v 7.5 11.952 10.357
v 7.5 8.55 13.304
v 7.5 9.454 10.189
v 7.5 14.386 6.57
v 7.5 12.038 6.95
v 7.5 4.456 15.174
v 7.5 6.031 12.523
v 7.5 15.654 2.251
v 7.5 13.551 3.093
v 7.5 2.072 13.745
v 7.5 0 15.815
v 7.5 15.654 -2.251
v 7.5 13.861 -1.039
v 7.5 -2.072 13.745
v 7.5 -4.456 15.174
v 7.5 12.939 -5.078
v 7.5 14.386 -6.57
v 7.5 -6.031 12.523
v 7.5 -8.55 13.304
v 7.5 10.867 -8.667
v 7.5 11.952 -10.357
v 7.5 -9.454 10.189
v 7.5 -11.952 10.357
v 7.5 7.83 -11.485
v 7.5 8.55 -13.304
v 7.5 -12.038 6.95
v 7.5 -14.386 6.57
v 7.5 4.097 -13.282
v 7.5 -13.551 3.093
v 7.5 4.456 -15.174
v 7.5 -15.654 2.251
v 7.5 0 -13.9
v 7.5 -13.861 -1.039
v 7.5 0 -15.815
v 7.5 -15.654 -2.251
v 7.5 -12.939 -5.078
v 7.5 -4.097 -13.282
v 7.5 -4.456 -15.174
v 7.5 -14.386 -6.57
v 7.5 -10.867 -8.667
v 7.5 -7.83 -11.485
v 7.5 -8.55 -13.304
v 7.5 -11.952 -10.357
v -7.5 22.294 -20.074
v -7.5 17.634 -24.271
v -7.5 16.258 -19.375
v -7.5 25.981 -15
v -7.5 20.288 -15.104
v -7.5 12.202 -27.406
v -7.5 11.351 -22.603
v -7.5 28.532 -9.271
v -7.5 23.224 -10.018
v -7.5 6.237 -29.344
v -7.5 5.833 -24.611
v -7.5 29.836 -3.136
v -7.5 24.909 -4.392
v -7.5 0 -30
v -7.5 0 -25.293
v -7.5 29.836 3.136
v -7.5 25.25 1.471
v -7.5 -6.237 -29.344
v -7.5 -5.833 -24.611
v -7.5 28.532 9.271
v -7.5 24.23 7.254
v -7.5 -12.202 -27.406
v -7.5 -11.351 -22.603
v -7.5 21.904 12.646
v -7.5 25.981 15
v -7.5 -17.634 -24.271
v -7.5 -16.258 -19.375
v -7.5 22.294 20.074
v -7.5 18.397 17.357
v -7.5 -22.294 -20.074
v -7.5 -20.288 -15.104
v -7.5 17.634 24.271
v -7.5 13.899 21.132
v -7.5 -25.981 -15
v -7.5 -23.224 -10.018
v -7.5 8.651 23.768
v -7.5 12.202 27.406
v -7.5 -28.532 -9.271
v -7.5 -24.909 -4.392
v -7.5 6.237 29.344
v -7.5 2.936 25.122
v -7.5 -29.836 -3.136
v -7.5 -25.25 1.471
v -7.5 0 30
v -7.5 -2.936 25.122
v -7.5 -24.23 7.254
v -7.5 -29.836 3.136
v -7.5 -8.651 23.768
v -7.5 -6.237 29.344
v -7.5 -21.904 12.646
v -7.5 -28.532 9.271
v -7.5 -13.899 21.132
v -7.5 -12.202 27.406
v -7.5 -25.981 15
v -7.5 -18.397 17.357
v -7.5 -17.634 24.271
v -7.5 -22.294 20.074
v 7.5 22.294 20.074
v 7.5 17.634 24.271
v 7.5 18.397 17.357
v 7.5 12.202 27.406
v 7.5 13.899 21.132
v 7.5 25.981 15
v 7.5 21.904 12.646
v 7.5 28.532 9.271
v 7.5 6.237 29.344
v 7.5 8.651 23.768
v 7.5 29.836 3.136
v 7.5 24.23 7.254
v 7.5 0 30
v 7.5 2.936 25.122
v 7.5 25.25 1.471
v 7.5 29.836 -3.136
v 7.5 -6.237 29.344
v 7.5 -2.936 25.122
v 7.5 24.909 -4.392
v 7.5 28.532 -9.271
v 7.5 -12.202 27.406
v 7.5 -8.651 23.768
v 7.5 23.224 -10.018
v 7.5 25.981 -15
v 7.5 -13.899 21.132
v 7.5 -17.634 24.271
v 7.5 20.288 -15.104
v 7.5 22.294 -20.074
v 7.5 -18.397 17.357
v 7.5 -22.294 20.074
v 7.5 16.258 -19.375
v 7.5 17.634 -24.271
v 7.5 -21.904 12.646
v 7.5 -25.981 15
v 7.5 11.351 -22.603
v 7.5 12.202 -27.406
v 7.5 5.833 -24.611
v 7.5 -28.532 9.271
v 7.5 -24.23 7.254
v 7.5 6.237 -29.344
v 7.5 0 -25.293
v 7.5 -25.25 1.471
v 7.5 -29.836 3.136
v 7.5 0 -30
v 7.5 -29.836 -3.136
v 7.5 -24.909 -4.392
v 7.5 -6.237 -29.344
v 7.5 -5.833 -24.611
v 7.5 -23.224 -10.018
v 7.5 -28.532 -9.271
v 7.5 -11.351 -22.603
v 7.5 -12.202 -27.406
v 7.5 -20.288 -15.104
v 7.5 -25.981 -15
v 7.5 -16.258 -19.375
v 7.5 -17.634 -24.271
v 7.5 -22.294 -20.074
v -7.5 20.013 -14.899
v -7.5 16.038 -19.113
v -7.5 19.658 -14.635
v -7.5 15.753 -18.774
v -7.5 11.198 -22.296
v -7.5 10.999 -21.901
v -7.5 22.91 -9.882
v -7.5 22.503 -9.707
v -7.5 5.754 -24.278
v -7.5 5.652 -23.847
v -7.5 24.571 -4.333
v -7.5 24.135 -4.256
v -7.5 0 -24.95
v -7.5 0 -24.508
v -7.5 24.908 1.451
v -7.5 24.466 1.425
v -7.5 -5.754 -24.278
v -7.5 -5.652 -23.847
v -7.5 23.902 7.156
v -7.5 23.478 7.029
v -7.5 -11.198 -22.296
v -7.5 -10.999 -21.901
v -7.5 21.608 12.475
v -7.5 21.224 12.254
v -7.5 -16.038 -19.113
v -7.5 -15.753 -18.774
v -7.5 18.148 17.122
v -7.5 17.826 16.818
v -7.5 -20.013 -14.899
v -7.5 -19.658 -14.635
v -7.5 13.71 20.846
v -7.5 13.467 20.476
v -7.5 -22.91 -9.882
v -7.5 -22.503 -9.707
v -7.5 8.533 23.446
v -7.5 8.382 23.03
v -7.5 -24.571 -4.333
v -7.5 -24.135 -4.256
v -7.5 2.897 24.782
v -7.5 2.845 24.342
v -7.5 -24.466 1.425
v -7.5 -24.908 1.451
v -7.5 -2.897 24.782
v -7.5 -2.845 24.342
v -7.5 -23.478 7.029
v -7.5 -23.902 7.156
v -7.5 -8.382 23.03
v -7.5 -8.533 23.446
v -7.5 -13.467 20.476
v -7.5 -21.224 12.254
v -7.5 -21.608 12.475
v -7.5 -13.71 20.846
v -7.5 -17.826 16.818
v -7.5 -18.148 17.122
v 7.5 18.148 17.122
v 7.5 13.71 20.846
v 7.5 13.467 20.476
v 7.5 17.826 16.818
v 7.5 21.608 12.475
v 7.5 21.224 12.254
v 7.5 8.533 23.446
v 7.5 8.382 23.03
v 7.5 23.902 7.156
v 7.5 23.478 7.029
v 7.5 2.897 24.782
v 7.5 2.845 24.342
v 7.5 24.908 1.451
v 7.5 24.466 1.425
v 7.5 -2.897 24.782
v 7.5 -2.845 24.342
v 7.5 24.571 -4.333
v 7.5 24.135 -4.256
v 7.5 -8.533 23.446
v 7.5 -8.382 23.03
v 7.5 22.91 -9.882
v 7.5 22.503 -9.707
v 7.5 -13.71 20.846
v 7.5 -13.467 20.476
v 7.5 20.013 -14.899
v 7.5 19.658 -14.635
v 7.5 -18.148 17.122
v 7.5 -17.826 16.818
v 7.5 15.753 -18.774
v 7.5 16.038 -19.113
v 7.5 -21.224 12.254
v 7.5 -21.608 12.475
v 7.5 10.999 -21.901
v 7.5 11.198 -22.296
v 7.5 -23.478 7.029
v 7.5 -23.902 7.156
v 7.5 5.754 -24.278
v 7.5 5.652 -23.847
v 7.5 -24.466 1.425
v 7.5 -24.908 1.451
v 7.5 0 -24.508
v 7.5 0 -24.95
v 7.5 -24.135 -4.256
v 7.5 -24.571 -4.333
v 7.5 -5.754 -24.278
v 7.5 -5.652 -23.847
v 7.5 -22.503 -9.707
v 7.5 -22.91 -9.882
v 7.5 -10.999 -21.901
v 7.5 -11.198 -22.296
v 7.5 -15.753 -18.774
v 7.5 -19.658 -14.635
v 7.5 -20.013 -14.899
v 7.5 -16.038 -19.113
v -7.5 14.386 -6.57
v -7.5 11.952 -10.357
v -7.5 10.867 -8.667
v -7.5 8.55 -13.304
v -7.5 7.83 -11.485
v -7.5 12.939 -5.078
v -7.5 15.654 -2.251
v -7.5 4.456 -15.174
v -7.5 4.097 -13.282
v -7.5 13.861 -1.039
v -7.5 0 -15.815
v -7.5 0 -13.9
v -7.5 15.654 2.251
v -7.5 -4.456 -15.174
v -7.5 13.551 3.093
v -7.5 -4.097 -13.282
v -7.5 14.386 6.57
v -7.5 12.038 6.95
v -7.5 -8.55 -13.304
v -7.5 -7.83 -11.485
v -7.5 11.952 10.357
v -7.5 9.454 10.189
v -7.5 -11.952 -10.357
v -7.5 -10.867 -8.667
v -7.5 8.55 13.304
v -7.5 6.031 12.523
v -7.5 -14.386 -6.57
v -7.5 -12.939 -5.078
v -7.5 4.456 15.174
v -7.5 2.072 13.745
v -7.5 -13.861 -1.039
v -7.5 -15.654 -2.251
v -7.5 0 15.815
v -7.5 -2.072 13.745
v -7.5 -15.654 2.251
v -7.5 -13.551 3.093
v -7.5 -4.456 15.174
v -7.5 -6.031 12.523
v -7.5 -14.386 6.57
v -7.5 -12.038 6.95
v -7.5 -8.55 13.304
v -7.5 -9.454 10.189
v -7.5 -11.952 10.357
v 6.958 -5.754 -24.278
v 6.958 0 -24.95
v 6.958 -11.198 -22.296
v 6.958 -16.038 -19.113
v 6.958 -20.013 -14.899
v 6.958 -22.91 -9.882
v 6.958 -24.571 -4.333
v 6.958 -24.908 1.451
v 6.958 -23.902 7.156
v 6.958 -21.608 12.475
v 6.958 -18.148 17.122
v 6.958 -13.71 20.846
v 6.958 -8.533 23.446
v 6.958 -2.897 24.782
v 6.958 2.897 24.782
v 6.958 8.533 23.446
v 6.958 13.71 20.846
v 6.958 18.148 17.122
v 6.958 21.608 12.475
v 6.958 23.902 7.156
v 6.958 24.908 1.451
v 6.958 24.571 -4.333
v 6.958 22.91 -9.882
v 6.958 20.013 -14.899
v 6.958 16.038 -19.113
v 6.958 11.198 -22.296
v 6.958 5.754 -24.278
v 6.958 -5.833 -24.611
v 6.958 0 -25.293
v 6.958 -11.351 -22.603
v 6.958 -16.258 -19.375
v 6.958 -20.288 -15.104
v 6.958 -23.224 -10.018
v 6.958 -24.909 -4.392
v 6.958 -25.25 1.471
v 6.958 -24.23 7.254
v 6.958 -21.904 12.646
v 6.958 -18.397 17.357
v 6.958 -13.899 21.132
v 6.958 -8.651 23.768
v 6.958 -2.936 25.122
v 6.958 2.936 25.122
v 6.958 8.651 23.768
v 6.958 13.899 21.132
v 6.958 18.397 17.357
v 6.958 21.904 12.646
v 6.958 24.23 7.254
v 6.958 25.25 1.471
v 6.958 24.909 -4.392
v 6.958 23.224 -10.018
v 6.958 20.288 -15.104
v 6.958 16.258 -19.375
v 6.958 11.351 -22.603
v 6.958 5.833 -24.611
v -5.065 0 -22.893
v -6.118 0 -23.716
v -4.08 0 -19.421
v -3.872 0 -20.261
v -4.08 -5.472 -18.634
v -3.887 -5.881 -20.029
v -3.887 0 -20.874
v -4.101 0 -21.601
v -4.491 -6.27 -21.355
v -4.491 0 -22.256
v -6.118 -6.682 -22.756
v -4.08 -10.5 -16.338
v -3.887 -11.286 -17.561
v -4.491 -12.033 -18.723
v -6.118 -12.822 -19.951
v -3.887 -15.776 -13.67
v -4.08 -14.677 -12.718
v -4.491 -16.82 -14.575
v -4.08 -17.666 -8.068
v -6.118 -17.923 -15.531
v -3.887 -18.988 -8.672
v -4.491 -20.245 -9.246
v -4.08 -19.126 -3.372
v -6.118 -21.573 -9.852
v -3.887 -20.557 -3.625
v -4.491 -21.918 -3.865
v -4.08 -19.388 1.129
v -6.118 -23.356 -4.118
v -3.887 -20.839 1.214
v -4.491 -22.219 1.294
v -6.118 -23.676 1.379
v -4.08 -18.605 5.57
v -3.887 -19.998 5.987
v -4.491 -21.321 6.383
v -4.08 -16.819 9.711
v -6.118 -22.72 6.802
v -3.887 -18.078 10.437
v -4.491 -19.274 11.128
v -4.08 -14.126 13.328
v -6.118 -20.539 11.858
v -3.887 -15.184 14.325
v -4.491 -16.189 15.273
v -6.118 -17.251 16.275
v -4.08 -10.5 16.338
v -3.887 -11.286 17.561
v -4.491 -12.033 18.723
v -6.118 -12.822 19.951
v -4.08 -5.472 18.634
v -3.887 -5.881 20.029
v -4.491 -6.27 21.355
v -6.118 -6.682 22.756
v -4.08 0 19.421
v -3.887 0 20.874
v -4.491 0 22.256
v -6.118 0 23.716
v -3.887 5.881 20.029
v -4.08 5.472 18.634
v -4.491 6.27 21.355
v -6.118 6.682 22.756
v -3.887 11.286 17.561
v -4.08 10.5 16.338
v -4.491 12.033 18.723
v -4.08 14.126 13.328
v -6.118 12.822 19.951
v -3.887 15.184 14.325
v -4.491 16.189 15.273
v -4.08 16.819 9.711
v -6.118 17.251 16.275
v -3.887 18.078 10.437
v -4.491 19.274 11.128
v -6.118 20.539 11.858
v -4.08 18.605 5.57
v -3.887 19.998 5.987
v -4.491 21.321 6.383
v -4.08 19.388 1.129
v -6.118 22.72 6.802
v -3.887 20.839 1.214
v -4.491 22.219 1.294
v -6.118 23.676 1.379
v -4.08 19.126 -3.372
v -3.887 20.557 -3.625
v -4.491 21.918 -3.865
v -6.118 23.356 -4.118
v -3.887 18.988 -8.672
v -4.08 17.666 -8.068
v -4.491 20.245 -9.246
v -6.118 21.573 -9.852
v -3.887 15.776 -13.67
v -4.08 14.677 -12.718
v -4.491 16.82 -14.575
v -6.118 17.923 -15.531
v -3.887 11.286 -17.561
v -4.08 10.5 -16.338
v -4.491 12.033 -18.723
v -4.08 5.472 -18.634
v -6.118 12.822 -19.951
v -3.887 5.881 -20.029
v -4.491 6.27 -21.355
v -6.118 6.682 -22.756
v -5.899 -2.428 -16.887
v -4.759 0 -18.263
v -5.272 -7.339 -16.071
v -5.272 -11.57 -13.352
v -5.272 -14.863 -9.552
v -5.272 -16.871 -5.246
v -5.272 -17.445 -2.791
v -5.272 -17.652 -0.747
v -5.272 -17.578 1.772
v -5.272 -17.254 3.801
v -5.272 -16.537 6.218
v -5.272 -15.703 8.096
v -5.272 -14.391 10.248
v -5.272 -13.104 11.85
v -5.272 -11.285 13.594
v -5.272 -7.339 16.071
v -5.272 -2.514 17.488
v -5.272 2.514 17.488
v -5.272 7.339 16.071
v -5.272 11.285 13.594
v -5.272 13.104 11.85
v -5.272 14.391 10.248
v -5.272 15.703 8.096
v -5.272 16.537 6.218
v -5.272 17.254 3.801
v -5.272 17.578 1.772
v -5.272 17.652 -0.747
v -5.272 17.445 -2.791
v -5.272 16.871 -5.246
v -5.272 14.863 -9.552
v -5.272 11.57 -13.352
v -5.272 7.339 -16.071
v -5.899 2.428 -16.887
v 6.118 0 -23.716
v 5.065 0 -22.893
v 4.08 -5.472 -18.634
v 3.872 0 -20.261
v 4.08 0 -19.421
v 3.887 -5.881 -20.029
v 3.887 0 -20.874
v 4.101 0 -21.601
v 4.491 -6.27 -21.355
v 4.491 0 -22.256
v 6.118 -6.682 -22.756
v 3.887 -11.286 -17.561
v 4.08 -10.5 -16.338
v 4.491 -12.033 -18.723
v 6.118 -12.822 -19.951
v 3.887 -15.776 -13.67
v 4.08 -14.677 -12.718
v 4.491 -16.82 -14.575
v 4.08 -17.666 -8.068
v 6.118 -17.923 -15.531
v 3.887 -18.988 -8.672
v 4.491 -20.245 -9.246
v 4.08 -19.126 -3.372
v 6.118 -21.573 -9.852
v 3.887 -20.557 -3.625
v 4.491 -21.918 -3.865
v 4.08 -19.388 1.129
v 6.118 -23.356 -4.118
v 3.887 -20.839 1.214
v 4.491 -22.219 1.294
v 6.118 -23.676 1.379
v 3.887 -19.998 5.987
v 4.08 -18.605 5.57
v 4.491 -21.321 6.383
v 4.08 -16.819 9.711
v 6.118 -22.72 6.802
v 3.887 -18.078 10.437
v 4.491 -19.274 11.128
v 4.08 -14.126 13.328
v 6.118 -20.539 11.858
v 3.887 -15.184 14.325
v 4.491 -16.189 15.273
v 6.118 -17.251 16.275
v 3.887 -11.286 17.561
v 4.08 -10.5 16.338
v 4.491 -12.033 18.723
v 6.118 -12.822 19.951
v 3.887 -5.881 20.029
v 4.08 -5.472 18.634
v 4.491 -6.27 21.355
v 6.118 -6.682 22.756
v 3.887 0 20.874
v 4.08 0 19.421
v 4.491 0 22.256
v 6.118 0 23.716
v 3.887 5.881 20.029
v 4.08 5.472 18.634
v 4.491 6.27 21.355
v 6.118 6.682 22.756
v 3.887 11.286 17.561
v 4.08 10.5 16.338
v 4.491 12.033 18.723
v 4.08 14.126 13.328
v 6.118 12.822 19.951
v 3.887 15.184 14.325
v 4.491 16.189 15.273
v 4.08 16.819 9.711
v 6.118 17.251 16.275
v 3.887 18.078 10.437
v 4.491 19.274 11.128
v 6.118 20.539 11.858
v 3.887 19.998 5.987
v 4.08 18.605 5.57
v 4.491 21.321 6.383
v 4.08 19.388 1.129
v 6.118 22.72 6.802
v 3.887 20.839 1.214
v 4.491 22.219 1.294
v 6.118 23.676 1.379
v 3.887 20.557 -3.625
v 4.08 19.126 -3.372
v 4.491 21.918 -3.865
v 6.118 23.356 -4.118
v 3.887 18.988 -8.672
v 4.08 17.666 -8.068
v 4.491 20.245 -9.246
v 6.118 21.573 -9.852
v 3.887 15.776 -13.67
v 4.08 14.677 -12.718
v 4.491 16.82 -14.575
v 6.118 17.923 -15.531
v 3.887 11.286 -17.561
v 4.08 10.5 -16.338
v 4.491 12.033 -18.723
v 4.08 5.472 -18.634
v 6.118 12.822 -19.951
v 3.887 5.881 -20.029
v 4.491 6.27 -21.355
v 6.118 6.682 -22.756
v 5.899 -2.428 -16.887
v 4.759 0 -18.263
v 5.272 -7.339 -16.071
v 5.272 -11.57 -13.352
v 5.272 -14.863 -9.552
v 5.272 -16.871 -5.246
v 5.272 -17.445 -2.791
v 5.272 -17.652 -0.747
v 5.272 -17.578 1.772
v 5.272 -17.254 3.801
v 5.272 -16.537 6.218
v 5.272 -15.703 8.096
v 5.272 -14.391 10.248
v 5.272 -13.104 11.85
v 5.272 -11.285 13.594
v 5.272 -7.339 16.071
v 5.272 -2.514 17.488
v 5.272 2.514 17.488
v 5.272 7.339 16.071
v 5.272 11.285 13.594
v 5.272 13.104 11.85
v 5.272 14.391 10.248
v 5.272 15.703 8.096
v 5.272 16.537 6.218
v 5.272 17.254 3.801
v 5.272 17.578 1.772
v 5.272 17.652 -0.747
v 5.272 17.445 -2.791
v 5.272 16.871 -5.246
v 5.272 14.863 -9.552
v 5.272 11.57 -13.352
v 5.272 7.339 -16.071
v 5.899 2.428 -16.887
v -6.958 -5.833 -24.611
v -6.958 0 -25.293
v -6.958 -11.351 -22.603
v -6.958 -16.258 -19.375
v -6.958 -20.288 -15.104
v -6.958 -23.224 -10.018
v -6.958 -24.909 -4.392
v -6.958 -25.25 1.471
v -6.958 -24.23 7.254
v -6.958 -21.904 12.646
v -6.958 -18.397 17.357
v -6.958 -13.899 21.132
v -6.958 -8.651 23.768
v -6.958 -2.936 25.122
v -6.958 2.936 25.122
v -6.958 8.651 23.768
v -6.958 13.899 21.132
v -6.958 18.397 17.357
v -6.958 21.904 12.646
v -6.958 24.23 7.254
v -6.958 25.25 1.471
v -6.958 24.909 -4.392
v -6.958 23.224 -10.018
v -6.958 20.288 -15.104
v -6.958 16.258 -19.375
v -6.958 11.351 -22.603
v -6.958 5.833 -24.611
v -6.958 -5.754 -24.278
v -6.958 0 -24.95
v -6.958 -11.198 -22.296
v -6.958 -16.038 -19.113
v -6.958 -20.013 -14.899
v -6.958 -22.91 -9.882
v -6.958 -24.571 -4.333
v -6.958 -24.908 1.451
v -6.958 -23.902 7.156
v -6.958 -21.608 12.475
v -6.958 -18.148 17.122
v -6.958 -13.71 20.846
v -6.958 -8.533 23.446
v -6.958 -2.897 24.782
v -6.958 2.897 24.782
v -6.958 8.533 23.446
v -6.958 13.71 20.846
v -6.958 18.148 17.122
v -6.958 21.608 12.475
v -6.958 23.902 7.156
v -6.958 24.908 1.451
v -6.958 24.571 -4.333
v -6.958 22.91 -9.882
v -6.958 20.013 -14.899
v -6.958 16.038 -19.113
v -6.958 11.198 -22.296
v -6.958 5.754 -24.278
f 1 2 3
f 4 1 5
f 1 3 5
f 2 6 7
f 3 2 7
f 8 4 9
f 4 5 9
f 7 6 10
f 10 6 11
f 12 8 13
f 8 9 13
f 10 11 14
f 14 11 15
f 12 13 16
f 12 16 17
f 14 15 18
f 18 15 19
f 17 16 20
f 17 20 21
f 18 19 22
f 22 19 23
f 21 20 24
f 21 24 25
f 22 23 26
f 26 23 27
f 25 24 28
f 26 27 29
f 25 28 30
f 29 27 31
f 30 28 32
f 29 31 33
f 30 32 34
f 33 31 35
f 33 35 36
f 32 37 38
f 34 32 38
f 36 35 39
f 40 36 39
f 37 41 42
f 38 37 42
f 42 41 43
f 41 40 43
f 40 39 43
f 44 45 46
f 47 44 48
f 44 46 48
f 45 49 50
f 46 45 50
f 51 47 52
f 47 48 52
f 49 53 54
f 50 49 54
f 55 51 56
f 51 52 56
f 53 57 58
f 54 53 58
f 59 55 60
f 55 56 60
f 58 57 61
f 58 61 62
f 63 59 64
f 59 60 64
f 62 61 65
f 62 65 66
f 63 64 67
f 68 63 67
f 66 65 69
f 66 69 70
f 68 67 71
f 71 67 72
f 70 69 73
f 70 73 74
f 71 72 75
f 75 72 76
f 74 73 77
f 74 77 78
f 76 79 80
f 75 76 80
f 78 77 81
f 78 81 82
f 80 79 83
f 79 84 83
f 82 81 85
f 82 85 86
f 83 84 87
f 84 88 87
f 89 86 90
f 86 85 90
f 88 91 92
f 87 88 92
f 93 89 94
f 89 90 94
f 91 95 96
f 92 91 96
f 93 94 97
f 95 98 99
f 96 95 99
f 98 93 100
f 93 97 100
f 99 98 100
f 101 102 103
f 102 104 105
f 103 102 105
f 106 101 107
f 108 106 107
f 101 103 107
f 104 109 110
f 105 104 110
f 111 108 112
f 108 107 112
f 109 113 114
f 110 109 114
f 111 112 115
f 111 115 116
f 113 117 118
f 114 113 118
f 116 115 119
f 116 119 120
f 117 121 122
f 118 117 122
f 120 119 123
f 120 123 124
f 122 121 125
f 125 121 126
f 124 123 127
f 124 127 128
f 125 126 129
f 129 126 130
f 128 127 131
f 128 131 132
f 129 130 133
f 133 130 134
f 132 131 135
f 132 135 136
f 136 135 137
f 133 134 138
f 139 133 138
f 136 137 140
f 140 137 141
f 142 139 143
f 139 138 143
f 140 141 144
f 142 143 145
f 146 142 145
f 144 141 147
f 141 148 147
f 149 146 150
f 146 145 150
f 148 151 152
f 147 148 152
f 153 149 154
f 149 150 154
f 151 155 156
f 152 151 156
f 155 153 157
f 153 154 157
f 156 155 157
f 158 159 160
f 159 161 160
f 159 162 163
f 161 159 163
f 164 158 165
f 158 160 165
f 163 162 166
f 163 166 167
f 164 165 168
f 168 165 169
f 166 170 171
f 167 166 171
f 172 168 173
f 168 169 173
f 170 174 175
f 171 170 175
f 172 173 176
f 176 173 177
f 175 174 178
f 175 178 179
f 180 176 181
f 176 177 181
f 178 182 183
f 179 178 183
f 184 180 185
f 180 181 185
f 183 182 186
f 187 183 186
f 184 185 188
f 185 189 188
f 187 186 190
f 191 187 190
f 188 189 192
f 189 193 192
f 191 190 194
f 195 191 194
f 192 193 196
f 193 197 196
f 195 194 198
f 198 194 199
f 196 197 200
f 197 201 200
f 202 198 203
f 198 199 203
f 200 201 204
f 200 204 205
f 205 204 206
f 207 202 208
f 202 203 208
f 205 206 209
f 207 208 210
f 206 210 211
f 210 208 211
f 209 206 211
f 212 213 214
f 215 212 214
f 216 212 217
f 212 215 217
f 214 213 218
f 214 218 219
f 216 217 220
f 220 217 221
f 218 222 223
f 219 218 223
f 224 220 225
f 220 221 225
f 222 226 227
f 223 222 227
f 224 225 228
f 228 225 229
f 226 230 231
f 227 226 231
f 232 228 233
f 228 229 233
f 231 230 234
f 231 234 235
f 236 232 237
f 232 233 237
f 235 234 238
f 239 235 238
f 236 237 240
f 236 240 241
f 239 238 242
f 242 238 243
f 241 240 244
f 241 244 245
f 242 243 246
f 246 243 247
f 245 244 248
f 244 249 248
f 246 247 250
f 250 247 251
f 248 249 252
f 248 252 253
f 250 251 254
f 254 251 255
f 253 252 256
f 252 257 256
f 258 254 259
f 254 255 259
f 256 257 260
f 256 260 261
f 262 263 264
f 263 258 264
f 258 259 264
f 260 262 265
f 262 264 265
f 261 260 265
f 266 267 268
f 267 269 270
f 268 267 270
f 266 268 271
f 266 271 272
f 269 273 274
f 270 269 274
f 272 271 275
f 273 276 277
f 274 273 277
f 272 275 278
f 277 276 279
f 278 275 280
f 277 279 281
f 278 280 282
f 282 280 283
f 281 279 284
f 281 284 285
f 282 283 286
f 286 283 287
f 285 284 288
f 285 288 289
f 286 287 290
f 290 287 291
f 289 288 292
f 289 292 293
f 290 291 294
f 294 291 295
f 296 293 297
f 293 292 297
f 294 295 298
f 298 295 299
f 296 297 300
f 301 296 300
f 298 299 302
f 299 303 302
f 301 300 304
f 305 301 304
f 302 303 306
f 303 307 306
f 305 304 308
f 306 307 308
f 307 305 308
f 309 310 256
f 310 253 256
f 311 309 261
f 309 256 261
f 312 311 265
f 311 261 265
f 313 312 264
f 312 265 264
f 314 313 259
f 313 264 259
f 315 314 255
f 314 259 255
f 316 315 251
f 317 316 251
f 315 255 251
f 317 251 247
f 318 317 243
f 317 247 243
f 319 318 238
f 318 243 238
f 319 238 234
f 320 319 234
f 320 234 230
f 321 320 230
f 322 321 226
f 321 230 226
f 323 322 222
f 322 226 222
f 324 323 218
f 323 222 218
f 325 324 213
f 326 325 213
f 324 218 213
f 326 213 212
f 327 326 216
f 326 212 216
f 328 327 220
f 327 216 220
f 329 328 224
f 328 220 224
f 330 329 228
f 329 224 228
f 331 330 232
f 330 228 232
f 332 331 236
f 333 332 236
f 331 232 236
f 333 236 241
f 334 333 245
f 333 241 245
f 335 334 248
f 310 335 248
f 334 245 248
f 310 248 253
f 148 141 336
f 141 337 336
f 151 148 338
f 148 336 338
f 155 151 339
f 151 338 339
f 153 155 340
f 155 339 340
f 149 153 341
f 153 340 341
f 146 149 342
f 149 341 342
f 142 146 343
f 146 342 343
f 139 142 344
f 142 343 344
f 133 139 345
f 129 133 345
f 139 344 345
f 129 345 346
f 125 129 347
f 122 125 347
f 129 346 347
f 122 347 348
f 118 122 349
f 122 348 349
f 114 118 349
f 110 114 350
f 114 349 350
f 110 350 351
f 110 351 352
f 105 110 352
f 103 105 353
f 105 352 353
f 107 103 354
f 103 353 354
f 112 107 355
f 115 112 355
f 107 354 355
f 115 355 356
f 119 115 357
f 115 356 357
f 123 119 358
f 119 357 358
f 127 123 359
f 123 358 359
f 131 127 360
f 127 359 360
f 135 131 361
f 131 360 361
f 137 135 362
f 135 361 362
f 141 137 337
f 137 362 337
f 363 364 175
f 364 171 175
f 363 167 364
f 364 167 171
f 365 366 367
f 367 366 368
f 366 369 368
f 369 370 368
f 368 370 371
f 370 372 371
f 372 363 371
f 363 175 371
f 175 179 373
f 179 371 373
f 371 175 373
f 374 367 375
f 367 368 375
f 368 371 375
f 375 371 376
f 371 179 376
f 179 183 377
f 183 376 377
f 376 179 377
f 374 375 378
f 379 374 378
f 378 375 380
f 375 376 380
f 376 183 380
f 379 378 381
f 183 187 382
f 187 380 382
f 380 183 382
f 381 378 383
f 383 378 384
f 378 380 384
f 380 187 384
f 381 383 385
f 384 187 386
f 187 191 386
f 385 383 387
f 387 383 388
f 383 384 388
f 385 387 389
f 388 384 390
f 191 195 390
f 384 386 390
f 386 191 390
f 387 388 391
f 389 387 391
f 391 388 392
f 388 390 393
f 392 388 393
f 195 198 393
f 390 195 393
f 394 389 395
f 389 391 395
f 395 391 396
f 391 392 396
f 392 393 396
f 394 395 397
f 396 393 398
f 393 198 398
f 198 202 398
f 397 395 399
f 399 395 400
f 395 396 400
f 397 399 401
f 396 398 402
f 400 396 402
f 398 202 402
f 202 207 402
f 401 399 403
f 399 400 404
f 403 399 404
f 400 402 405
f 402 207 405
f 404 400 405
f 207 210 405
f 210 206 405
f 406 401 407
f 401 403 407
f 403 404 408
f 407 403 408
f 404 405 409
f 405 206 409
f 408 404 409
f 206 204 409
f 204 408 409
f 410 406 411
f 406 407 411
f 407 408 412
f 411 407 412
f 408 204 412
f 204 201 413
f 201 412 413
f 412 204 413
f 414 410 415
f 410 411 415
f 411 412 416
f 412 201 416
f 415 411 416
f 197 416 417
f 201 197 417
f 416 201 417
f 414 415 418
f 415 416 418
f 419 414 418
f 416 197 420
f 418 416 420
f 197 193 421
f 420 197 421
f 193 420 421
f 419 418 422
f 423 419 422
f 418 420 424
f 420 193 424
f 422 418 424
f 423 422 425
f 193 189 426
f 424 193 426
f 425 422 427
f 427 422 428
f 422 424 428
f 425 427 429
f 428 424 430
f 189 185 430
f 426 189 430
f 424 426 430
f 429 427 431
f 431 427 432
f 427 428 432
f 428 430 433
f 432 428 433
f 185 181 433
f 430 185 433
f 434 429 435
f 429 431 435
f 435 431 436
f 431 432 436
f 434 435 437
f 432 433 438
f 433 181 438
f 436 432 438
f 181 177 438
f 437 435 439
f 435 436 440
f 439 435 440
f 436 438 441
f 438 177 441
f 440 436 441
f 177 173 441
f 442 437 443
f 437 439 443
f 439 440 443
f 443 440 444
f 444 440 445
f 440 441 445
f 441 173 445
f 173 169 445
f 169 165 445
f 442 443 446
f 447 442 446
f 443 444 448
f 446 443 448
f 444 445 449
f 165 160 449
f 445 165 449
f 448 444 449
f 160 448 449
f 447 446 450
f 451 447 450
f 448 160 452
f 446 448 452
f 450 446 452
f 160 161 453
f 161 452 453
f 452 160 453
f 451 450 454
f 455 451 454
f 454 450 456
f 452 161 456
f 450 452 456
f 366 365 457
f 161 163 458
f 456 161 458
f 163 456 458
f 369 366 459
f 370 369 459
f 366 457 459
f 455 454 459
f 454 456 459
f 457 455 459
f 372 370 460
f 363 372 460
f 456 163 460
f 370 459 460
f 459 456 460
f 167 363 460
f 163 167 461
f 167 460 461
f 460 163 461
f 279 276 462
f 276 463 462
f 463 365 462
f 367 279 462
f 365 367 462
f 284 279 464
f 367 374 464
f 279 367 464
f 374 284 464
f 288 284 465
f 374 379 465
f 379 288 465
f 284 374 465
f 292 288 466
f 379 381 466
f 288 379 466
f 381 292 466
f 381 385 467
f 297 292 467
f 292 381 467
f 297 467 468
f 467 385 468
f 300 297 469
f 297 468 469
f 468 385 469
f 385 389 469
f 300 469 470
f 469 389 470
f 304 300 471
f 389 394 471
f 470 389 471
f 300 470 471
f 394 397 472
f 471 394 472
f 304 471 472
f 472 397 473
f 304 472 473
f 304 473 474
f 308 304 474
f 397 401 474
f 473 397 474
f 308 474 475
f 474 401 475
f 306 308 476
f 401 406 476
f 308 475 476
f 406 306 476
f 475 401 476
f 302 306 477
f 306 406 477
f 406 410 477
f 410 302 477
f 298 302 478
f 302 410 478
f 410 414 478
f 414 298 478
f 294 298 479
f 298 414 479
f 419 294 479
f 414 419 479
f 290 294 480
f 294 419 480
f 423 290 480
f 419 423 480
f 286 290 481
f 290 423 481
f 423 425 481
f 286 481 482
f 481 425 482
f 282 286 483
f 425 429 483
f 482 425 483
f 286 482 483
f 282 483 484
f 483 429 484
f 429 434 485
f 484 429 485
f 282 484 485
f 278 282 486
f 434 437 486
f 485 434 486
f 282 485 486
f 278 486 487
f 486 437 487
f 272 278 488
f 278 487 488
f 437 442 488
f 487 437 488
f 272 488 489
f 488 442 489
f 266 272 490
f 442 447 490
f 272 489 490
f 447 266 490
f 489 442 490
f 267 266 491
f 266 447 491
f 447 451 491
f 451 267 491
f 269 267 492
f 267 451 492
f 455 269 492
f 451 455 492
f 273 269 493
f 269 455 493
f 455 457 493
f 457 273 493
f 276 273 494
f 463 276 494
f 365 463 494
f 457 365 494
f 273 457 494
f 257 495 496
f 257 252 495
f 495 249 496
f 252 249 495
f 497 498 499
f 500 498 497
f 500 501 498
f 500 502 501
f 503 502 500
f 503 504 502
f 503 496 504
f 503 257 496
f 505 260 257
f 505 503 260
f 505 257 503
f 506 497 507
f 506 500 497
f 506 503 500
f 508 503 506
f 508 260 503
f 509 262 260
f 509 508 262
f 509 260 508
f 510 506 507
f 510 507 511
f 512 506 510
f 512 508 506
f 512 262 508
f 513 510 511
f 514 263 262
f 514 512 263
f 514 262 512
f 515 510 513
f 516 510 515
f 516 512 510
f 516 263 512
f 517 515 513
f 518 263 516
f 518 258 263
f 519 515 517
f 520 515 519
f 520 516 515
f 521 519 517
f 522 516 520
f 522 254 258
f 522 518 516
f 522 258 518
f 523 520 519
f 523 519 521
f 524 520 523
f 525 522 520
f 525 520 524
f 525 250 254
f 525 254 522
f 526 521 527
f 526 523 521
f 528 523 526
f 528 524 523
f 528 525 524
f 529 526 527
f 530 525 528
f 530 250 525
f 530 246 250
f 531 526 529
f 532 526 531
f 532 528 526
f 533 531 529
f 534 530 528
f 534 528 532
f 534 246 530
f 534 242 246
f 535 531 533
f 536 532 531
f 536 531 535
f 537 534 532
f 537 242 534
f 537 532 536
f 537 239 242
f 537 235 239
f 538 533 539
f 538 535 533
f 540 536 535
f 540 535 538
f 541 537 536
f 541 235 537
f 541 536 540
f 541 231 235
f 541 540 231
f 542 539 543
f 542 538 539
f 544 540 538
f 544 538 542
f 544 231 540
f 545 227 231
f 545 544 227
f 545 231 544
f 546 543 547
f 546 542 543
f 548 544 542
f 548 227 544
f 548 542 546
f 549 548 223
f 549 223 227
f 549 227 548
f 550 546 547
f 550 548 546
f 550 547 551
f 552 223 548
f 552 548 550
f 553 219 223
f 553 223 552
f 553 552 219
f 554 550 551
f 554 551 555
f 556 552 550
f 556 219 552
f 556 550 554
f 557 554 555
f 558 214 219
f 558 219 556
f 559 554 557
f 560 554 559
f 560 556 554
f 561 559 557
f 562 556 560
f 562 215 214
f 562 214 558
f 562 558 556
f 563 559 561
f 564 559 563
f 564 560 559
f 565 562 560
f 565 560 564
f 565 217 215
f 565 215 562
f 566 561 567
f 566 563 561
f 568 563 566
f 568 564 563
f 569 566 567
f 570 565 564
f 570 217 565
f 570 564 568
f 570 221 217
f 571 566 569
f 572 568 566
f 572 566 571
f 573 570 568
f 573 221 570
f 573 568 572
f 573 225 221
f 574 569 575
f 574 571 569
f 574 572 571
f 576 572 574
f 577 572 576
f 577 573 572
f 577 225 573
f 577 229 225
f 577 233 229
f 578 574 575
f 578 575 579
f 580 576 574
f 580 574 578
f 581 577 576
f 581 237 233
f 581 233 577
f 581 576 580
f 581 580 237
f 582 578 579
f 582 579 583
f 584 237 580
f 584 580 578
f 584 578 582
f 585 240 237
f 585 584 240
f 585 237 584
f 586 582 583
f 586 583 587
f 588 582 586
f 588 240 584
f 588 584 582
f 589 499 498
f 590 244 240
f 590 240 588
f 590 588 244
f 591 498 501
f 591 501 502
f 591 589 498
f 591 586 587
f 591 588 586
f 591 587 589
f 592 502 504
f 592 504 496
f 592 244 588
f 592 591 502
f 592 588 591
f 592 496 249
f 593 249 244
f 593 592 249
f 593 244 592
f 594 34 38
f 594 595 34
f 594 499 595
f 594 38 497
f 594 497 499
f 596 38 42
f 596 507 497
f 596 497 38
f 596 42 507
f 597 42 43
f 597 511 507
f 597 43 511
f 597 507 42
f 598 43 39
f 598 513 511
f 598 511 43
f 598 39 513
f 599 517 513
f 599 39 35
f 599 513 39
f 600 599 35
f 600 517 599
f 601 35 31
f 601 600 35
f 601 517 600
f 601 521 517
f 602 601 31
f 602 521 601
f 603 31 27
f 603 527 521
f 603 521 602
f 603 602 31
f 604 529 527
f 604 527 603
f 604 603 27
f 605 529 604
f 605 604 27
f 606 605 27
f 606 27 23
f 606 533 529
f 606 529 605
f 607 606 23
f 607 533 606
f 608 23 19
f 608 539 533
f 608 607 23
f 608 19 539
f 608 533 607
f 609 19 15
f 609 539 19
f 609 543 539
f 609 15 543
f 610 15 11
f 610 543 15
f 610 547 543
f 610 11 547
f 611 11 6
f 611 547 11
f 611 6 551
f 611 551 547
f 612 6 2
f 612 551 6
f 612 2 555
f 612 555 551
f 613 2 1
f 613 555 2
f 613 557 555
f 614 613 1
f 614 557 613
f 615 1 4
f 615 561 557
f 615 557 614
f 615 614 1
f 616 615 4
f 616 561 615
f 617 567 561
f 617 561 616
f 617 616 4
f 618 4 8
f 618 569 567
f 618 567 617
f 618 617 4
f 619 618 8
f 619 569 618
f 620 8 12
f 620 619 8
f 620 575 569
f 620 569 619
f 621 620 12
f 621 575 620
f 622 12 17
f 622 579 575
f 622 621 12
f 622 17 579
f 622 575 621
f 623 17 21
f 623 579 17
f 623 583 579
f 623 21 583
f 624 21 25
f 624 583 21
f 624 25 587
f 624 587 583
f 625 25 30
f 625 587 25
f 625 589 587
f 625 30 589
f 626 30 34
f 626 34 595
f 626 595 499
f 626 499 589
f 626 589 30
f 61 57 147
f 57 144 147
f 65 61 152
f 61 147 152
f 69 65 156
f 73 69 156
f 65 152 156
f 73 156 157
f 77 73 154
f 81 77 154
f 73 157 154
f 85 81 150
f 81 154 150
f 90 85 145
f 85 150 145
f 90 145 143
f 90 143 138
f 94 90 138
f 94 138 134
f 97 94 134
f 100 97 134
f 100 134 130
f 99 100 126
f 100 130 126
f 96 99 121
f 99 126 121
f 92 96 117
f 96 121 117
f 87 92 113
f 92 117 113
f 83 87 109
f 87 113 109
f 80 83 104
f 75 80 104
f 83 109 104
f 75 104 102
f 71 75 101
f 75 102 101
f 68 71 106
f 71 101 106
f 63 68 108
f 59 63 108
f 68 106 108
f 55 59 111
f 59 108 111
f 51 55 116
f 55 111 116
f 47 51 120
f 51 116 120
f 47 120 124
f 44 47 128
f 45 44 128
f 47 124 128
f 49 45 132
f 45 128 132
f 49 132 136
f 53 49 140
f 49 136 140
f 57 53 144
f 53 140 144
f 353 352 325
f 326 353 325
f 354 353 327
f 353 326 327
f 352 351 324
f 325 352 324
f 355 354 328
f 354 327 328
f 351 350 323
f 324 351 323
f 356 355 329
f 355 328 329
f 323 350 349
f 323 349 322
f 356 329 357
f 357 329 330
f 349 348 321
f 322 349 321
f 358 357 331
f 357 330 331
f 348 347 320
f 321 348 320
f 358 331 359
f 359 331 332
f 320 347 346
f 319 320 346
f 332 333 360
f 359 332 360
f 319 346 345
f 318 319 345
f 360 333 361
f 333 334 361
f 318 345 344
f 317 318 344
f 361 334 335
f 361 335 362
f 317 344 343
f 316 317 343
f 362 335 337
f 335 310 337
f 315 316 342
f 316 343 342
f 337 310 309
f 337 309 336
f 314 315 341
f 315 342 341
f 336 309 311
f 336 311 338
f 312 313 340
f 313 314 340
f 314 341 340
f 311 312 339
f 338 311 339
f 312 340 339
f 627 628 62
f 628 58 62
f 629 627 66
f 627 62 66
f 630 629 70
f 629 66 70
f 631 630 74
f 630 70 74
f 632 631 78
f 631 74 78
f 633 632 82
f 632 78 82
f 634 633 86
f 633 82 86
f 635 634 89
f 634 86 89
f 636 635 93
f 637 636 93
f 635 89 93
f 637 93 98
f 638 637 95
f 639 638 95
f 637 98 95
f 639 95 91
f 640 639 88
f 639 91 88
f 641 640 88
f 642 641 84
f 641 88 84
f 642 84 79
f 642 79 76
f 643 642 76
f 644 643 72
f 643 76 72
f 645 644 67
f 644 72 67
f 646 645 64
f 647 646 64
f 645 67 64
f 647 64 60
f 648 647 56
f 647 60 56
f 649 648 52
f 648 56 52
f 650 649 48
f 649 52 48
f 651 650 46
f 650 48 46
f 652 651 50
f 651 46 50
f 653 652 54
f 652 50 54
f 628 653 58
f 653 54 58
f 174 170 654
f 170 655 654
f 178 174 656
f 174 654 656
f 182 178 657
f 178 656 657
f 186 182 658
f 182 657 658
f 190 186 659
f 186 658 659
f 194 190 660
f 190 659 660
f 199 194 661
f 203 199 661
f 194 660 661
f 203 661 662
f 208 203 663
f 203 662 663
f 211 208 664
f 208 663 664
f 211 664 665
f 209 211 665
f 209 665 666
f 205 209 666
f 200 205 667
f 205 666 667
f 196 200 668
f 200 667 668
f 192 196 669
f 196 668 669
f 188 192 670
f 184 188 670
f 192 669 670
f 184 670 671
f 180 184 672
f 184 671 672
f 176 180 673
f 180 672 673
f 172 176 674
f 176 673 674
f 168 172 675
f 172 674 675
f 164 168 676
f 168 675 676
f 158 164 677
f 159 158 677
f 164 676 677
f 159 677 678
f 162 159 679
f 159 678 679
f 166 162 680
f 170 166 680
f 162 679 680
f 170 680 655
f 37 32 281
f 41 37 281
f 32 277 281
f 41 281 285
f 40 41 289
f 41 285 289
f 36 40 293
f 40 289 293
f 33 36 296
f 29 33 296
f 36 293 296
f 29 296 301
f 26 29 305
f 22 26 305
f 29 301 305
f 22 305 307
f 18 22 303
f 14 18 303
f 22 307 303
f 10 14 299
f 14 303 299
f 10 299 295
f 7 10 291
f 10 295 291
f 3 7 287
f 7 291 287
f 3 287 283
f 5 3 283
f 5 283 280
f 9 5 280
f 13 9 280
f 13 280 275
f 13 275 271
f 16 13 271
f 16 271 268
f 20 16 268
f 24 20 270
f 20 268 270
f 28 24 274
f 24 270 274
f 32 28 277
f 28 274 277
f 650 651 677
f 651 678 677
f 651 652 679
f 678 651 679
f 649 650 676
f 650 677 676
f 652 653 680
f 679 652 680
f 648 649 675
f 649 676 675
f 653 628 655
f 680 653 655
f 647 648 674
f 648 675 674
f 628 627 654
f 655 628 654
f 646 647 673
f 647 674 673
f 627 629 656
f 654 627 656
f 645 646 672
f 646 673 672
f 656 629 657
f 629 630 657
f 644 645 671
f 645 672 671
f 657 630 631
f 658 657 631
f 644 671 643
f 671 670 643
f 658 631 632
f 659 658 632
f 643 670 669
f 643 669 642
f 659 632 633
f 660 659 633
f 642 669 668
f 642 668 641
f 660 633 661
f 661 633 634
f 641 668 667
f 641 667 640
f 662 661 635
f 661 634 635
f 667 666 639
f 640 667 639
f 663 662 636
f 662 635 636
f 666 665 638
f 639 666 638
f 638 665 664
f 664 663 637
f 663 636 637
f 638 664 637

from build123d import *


with BuildPart() as part:
    # Sketch1 → Revolve1 (revolve)
    with BuildSketch(Plane.XY, mode=Mode.PRIVATE) as revolve1_sk:
        with BuildLine():
            Line((7.5, 13.9), (-7.5, 13.9))
            Line((-7.5, 13.9), (-7.5, 15.815032431))
            add(Edge.make_bspline(
                [(-7.5, 15.815032431), (-0.221533759, 20.854783747), (-7.5, 24.507708918)],
                knots=[0, 0, 0, 1, 1, 1], degree=2))
            Line((-7.5, 24.507708918), (-7.5, 24.950271606))
            Line((-7.5, 24.950271606), (-6.958076182, 24.950271606))
            Line((-6.958076182, 24.950271606), (-6.958076182, 25.292900784))
            Line((-6.958076182, 25.292900784), (-7.5, 25.292900784))
            Line((-7.5, 25.292900784), (-7.5, 30))
            Line((-7.5, 30), (7.5, 30))
            Line((7.5, 30), (7.5, 25.292900784))
            Line((7.5, 25.292900784), (6.958076182, 25.292900784))
            Line((6.958076182, 25.292900784), (6.958076182, 24.950271606))
            Line((6.958076182, 24.950271606), (7.5, 24.950271606))
            Line((7.5, 24.950271606), (7.5, 24.507708918))
            add(Edge.make_bspline(
                [(7.5, 15.815032431), (0.221533759, 20.854783747), (7.5, 24.507708918)],
                knots=[0, 0, 0, 1, 1, 1], degree=2))
            Line((7.5, 15.815032431), (7.5, 13.9))
        make_face()
    revolve(revolve1_sk.sketch.rotate(Axis((37.422784058, 0, 0), (-1, 0, 0)), 90), axis=Axis((37.422784058, 0, 0), (-1, 0, 0)))


solid = part.part
